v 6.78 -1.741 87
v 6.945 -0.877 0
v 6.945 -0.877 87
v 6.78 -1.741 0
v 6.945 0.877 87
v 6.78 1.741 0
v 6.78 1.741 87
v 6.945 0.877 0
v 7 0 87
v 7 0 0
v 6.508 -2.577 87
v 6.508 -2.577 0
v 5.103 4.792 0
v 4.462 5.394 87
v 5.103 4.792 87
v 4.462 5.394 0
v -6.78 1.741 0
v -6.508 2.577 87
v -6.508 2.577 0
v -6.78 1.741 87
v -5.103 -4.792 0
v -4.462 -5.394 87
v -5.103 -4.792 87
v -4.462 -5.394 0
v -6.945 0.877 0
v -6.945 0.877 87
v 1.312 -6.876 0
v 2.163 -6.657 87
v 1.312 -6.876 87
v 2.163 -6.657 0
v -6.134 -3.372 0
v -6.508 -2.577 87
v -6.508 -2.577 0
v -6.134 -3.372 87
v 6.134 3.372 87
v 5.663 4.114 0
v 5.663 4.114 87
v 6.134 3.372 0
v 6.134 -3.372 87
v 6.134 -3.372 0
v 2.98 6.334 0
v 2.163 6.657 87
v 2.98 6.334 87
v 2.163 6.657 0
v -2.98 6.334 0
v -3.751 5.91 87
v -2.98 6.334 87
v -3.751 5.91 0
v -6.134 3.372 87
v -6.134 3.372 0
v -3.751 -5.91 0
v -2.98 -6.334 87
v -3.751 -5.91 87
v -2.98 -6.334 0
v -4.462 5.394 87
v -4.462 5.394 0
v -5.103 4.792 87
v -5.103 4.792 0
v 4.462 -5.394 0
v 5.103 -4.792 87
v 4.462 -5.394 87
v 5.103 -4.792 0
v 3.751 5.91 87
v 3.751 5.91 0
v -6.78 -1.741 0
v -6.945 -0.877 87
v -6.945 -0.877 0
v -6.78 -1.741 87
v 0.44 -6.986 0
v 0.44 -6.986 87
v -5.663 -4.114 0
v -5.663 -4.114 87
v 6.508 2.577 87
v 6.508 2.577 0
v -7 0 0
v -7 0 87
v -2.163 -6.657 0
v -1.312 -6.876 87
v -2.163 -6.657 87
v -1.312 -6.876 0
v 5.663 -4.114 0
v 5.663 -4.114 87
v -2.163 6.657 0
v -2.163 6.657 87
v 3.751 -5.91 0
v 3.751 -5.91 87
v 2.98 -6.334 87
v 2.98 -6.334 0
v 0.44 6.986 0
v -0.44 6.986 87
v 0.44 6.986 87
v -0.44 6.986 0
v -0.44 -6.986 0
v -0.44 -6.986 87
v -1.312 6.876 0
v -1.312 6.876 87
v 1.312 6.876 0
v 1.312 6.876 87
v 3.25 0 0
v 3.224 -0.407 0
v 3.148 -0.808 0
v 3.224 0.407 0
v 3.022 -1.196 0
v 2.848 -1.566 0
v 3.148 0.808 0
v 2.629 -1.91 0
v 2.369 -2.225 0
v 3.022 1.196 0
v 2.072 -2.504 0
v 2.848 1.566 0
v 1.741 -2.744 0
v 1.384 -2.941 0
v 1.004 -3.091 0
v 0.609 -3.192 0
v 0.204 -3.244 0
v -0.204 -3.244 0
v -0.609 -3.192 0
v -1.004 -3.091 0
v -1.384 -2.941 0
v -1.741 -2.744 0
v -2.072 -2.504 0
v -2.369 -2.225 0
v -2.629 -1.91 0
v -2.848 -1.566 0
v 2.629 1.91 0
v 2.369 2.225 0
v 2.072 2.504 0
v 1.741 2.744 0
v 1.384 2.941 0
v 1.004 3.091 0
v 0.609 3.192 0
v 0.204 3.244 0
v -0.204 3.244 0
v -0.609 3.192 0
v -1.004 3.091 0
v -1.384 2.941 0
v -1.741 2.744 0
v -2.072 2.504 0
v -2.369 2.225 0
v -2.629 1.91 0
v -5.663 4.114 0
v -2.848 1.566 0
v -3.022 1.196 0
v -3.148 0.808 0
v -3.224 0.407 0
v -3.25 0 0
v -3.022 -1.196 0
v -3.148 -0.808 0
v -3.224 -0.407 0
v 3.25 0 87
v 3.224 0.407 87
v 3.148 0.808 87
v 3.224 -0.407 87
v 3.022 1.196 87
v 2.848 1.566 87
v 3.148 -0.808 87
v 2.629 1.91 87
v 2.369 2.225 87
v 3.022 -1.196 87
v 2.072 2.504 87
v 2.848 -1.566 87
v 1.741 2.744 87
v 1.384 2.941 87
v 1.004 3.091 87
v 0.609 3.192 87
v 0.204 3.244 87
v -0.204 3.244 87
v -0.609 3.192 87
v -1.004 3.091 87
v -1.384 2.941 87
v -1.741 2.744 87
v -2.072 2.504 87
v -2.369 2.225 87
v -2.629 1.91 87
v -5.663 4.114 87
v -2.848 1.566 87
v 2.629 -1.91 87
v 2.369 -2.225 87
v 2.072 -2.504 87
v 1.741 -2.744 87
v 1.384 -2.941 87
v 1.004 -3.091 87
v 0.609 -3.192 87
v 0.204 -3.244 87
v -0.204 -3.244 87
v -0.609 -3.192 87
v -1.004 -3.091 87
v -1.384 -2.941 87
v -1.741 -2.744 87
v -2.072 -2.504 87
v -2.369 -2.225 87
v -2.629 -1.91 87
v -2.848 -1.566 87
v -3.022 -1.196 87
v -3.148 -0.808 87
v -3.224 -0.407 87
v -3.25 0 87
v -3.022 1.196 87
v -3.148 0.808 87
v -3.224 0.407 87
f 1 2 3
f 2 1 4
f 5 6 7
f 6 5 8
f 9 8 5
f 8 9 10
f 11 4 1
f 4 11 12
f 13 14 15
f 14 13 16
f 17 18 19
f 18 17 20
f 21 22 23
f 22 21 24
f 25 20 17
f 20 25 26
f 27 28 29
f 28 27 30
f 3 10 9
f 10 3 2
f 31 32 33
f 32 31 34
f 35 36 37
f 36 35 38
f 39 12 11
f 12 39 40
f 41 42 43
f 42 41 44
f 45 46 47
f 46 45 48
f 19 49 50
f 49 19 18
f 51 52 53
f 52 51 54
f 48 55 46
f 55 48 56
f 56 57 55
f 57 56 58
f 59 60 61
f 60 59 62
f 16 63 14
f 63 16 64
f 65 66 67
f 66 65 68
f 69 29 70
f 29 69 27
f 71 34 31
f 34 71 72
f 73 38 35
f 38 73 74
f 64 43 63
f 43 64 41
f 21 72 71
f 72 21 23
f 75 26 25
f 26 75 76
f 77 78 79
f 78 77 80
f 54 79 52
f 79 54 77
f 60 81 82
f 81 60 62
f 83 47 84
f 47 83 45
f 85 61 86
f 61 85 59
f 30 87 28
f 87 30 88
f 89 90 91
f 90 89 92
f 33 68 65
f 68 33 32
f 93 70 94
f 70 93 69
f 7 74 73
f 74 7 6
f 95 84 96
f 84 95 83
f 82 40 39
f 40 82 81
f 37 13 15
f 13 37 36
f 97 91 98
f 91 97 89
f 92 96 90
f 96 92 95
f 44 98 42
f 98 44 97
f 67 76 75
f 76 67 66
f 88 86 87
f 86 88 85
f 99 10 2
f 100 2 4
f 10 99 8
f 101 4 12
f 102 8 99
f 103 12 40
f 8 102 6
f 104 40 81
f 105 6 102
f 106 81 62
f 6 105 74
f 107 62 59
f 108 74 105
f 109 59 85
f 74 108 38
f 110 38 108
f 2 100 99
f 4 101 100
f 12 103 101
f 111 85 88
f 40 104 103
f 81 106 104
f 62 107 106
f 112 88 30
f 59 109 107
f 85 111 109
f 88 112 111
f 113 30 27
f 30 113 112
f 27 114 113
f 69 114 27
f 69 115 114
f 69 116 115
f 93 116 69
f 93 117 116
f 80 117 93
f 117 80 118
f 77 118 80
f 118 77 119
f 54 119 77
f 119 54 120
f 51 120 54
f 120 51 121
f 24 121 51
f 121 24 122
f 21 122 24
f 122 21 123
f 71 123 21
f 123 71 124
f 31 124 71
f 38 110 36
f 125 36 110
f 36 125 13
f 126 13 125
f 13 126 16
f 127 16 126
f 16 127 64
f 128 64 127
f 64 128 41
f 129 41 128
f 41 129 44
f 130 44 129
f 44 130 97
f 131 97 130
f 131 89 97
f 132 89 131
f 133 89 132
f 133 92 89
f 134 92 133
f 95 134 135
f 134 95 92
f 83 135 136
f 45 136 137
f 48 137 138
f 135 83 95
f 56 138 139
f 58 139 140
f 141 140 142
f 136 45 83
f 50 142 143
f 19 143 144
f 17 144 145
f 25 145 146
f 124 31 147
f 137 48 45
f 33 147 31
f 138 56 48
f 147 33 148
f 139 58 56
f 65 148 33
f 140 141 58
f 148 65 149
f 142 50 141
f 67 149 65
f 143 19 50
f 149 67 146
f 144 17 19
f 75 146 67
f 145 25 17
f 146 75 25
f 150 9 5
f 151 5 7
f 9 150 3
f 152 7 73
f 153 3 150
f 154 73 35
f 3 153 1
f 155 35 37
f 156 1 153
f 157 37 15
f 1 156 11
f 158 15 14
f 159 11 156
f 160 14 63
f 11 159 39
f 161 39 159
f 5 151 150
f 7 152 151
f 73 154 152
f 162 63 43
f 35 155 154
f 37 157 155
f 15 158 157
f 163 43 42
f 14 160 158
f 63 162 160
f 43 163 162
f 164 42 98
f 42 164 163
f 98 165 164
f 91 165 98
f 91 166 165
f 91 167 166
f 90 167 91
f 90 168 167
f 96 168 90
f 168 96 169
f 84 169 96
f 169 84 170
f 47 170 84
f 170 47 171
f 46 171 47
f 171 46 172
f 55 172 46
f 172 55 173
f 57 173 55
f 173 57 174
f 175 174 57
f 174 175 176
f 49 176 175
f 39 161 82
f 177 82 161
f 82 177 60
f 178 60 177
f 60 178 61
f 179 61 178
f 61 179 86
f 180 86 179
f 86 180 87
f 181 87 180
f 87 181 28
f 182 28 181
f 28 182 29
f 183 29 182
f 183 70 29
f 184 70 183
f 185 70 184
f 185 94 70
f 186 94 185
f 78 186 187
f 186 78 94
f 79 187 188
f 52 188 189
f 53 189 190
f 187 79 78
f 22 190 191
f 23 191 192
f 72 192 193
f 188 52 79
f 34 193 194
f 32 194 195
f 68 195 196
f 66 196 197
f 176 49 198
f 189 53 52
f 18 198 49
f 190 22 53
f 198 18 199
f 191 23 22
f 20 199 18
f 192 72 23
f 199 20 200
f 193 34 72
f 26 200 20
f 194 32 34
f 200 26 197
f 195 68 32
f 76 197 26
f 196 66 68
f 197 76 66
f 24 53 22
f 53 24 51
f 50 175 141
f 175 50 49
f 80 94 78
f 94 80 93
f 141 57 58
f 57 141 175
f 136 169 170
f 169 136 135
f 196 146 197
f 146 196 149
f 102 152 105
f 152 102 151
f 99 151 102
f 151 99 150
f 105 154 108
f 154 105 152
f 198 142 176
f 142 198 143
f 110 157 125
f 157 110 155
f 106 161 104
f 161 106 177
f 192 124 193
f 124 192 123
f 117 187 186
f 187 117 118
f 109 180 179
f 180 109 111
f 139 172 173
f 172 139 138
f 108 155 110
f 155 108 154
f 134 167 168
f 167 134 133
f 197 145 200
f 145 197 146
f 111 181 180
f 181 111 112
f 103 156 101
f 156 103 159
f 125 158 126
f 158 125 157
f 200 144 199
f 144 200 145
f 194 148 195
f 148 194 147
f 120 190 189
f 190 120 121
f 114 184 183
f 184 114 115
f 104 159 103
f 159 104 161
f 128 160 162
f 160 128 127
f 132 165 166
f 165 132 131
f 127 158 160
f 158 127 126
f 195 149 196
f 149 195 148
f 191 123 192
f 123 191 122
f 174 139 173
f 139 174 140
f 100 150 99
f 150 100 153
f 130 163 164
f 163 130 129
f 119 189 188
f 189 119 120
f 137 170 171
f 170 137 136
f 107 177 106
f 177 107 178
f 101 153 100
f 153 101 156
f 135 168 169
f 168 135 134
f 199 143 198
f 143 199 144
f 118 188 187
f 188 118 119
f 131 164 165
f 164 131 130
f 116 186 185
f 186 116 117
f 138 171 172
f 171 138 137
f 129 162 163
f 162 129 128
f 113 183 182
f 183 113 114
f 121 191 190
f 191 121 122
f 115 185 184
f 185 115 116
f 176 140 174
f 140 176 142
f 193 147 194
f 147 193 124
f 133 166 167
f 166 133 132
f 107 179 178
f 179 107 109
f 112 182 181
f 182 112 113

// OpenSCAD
$fn = 50;


difference() {
	union() {
		cylinder(h = 87, r = 7.0000000000);
	}
	union() {
		translate(v = [0, 0, -100]) {
			cylinder(h = 200, r = 3.2500000000);
		}
	}
}
